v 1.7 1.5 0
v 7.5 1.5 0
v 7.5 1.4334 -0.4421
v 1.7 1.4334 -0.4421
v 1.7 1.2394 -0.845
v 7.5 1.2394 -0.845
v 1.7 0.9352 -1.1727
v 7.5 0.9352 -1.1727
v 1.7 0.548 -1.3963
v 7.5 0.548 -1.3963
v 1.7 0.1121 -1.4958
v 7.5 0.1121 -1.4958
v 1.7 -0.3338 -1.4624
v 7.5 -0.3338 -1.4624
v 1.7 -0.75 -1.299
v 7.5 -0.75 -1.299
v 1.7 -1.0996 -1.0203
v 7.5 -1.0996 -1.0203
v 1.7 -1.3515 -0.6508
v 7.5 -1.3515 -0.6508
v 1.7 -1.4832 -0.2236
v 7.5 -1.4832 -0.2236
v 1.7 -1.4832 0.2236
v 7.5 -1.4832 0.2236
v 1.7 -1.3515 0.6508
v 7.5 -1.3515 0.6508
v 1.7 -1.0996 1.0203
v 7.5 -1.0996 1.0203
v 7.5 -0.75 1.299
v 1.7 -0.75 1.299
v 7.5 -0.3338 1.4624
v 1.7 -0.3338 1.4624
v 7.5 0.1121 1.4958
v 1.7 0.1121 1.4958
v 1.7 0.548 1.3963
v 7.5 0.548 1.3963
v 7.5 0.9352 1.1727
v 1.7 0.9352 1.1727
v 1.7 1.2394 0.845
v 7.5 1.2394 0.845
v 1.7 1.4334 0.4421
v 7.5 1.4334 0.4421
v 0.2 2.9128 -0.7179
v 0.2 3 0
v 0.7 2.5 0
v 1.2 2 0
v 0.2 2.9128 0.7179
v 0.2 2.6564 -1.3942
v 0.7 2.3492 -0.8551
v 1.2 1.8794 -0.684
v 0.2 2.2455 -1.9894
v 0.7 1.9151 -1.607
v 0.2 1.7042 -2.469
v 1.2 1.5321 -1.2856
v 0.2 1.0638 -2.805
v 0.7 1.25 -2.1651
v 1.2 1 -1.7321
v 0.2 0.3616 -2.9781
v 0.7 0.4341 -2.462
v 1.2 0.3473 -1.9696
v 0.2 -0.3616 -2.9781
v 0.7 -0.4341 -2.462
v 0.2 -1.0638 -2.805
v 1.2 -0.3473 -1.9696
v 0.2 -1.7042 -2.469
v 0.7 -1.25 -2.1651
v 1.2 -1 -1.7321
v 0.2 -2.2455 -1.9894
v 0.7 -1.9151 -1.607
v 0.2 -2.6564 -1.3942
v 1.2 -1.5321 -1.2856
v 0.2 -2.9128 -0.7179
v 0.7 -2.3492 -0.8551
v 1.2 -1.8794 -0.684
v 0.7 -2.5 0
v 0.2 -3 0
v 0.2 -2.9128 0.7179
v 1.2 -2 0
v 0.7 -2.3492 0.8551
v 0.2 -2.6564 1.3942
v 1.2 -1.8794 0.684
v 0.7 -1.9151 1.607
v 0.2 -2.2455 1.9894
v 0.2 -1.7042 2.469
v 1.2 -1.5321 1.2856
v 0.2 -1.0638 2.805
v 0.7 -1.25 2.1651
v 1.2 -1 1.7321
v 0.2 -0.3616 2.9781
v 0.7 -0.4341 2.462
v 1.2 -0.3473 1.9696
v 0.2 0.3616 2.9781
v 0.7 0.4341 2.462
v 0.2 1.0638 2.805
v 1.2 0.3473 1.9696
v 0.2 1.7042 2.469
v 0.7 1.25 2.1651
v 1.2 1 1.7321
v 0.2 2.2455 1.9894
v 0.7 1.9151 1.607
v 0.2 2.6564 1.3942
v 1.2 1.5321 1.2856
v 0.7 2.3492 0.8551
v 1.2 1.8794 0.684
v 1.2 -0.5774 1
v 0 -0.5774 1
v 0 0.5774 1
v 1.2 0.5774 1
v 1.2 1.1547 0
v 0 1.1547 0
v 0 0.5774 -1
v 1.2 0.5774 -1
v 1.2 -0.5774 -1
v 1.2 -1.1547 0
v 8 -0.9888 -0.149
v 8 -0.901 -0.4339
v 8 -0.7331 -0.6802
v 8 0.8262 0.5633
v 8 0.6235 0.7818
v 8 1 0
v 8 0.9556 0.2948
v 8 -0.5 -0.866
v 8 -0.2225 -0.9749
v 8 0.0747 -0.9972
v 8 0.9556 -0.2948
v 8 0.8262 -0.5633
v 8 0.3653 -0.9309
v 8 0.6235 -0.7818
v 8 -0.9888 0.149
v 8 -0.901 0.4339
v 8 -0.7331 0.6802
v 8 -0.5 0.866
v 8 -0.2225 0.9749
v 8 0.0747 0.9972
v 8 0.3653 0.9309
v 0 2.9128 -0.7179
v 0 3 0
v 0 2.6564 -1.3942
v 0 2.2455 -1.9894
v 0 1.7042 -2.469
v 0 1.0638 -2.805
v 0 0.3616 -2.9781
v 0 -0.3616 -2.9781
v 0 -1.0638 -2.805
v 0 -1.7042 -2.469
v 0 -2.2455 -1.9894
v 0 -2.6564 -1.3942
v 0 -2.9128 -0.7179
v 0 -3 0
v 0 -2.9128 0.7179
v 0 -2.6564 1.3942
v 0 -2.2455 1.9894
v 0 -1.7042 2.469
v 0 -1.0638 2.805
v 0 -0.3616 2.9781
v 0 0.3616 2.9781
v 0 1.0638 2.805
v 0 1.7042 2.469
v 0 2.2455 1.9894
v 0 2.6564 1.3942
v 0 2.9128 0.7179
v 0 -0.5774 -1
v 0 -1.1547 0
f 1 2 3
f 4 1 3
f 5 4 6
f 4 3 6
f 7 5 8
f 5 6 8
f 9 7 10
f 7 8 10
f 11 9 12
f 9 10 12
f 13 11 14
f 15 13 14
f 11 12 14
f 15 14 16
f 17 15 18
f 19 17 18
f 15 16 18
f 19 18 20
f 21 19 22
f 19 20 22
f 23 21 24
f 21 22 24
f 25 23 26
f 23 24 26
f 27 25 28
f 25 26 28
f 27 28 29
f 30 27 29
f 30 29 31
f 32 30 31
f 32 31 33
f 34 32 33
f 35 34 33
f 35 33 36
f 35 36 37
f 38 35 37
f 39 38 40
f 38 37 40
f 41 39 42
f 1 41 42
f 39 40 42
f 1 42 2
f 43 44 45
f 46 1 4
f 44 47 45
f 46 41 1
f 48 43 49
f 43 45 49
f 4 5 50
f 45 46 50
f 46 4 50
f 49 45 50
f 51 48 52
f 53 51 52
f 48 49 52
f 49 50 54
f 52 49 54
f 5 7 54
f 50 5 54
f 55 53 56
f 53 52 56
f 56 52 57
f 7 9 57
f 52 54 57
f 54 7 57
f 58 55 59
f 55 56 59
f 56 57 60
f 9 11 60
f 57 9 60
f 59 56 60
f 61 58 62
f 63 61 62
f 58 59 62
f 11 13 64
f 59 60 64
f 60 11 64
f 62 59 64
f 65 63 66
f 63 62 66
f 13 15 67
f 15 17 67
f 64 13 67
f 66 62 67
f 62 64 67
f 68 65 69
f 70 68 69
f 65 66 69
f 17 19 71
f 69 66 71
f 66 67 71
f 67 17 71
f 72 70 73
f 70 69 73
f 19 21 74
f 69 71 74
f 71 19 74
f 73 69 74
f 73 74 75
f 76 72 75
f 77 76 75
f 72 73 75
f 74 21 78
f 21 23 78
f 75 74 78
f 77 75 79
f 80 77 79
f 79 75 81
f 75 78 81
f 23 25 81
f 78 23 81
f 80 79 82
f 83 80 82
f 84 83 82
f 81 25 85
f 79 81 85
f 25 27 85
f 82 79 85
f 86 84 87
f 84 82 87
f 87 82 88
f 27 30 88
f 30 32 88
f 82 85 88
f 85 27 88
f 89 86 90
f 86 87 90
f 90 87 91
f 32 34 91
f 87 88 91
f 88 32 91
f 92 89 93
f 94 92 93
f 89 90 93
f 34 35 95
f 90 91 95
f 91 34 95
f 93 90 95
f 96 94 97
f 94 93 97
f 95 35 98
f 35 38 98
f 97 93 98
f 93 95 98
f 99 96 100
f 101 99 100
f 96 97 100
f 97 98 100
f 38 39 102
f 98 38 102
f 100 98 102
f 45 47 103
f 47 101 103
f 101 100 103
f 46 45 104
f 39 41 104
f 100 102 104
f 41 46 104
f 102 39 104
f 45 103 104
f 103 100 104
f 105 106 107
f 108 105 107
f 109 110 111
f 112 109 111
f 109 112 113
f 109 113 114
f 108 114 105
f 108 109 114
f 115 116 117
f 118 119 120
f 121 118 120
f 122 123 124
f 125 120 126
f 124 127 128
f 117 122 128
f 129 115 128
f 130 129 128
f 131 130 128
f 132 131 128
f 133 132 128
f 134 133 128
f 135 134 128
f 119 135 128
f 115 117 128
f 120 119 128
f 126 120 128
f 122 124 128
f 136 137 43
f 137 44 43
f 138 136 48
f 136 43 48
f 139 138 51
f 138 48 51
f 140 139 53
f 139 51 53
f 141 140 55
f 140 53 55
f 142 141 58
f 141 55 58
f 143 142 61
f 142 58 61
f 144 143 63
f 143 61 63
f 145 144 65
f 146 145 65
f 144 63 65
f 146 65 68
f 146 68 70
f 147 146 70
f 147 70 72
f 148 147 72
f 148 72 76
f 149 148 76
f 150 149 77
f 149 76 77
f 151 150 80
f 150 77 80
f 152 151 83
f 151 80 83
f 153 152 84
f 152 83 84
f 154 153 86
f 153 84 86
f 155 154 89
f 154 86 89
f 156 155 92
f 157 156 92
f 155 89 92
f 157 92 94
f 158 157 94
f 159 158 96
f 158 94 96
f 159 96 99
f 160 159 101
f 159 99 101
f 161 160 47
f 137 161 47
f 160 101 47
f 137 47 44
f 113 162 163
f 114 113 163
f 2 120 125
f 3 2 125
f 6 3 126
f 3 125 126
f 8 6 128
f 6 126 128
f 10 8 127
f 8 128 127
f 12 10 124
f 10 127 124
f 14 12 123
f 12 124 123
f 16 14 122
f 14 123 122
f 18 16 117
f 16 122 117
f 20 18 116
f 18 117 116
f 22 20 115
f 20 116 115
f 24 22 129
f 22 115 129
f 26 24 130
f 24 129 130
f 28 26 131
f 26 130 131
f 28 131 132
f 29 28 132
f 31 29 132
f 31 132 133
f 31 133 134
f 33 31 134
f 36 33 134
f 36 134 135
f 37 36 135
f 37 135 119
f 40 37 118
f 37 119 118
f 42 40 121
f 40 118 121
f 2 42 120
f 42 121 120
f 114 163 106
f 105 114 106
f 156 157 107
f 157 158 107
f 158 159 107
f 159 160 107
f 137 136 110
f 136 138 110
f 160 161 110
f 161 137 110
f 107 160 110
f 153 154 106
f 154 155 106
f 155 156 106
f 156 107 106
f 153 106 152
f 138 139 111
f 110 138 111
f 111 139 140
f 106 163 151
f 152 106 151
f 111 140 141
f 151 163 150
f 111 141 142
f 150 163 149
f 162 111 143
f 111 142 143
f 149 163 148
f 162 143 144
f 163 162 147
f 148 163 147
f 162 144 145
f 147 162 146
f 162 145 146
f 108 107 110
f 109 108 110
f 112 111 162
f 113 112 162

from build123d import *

# Parameters (mm, degrees)
CHANFREIN1_SIZE         = 0.5
ENL_V_MAT_EXTRU_1_DEPTH = 1.2


with BuildPart() as part:
    # Esquisse1 → Révolution1 (revolve)
    with BuildSketch(Plane.XY):
        Polygon((0, 0), (0, 3), (0.2, 3), (1.7, 1.5), (8, 1.5), (8, 0), align=None)
    revolve(axis=Axis((8, 0, 0), (-1, 0, 0)))

    # Chanfrein1
    chanfrein1_edges = [part.edges().sort_by_distance(p)[0] for p in [
        (8, -1.5, 0),
    ]]
    chamfer(chanfrein1_edges, length=CHANFREIN1_SIZE)

    # Esquisse2 → Enlèv. mat.-Extru.1 (cut)
    with BuildSketch(Plane.ZY):
        Polygon((0, 1.154700538), (-1, 0.577350269), (-1, -0.577350269), (0, -1.154700538), (1, -0.577350269), (1, 0.577350269), align=None)
    extrude(amount=-ENL_V_MAT_EXTRU_1_DEPTH, mode=Mode.SUBTRACT)


solid = part.part
